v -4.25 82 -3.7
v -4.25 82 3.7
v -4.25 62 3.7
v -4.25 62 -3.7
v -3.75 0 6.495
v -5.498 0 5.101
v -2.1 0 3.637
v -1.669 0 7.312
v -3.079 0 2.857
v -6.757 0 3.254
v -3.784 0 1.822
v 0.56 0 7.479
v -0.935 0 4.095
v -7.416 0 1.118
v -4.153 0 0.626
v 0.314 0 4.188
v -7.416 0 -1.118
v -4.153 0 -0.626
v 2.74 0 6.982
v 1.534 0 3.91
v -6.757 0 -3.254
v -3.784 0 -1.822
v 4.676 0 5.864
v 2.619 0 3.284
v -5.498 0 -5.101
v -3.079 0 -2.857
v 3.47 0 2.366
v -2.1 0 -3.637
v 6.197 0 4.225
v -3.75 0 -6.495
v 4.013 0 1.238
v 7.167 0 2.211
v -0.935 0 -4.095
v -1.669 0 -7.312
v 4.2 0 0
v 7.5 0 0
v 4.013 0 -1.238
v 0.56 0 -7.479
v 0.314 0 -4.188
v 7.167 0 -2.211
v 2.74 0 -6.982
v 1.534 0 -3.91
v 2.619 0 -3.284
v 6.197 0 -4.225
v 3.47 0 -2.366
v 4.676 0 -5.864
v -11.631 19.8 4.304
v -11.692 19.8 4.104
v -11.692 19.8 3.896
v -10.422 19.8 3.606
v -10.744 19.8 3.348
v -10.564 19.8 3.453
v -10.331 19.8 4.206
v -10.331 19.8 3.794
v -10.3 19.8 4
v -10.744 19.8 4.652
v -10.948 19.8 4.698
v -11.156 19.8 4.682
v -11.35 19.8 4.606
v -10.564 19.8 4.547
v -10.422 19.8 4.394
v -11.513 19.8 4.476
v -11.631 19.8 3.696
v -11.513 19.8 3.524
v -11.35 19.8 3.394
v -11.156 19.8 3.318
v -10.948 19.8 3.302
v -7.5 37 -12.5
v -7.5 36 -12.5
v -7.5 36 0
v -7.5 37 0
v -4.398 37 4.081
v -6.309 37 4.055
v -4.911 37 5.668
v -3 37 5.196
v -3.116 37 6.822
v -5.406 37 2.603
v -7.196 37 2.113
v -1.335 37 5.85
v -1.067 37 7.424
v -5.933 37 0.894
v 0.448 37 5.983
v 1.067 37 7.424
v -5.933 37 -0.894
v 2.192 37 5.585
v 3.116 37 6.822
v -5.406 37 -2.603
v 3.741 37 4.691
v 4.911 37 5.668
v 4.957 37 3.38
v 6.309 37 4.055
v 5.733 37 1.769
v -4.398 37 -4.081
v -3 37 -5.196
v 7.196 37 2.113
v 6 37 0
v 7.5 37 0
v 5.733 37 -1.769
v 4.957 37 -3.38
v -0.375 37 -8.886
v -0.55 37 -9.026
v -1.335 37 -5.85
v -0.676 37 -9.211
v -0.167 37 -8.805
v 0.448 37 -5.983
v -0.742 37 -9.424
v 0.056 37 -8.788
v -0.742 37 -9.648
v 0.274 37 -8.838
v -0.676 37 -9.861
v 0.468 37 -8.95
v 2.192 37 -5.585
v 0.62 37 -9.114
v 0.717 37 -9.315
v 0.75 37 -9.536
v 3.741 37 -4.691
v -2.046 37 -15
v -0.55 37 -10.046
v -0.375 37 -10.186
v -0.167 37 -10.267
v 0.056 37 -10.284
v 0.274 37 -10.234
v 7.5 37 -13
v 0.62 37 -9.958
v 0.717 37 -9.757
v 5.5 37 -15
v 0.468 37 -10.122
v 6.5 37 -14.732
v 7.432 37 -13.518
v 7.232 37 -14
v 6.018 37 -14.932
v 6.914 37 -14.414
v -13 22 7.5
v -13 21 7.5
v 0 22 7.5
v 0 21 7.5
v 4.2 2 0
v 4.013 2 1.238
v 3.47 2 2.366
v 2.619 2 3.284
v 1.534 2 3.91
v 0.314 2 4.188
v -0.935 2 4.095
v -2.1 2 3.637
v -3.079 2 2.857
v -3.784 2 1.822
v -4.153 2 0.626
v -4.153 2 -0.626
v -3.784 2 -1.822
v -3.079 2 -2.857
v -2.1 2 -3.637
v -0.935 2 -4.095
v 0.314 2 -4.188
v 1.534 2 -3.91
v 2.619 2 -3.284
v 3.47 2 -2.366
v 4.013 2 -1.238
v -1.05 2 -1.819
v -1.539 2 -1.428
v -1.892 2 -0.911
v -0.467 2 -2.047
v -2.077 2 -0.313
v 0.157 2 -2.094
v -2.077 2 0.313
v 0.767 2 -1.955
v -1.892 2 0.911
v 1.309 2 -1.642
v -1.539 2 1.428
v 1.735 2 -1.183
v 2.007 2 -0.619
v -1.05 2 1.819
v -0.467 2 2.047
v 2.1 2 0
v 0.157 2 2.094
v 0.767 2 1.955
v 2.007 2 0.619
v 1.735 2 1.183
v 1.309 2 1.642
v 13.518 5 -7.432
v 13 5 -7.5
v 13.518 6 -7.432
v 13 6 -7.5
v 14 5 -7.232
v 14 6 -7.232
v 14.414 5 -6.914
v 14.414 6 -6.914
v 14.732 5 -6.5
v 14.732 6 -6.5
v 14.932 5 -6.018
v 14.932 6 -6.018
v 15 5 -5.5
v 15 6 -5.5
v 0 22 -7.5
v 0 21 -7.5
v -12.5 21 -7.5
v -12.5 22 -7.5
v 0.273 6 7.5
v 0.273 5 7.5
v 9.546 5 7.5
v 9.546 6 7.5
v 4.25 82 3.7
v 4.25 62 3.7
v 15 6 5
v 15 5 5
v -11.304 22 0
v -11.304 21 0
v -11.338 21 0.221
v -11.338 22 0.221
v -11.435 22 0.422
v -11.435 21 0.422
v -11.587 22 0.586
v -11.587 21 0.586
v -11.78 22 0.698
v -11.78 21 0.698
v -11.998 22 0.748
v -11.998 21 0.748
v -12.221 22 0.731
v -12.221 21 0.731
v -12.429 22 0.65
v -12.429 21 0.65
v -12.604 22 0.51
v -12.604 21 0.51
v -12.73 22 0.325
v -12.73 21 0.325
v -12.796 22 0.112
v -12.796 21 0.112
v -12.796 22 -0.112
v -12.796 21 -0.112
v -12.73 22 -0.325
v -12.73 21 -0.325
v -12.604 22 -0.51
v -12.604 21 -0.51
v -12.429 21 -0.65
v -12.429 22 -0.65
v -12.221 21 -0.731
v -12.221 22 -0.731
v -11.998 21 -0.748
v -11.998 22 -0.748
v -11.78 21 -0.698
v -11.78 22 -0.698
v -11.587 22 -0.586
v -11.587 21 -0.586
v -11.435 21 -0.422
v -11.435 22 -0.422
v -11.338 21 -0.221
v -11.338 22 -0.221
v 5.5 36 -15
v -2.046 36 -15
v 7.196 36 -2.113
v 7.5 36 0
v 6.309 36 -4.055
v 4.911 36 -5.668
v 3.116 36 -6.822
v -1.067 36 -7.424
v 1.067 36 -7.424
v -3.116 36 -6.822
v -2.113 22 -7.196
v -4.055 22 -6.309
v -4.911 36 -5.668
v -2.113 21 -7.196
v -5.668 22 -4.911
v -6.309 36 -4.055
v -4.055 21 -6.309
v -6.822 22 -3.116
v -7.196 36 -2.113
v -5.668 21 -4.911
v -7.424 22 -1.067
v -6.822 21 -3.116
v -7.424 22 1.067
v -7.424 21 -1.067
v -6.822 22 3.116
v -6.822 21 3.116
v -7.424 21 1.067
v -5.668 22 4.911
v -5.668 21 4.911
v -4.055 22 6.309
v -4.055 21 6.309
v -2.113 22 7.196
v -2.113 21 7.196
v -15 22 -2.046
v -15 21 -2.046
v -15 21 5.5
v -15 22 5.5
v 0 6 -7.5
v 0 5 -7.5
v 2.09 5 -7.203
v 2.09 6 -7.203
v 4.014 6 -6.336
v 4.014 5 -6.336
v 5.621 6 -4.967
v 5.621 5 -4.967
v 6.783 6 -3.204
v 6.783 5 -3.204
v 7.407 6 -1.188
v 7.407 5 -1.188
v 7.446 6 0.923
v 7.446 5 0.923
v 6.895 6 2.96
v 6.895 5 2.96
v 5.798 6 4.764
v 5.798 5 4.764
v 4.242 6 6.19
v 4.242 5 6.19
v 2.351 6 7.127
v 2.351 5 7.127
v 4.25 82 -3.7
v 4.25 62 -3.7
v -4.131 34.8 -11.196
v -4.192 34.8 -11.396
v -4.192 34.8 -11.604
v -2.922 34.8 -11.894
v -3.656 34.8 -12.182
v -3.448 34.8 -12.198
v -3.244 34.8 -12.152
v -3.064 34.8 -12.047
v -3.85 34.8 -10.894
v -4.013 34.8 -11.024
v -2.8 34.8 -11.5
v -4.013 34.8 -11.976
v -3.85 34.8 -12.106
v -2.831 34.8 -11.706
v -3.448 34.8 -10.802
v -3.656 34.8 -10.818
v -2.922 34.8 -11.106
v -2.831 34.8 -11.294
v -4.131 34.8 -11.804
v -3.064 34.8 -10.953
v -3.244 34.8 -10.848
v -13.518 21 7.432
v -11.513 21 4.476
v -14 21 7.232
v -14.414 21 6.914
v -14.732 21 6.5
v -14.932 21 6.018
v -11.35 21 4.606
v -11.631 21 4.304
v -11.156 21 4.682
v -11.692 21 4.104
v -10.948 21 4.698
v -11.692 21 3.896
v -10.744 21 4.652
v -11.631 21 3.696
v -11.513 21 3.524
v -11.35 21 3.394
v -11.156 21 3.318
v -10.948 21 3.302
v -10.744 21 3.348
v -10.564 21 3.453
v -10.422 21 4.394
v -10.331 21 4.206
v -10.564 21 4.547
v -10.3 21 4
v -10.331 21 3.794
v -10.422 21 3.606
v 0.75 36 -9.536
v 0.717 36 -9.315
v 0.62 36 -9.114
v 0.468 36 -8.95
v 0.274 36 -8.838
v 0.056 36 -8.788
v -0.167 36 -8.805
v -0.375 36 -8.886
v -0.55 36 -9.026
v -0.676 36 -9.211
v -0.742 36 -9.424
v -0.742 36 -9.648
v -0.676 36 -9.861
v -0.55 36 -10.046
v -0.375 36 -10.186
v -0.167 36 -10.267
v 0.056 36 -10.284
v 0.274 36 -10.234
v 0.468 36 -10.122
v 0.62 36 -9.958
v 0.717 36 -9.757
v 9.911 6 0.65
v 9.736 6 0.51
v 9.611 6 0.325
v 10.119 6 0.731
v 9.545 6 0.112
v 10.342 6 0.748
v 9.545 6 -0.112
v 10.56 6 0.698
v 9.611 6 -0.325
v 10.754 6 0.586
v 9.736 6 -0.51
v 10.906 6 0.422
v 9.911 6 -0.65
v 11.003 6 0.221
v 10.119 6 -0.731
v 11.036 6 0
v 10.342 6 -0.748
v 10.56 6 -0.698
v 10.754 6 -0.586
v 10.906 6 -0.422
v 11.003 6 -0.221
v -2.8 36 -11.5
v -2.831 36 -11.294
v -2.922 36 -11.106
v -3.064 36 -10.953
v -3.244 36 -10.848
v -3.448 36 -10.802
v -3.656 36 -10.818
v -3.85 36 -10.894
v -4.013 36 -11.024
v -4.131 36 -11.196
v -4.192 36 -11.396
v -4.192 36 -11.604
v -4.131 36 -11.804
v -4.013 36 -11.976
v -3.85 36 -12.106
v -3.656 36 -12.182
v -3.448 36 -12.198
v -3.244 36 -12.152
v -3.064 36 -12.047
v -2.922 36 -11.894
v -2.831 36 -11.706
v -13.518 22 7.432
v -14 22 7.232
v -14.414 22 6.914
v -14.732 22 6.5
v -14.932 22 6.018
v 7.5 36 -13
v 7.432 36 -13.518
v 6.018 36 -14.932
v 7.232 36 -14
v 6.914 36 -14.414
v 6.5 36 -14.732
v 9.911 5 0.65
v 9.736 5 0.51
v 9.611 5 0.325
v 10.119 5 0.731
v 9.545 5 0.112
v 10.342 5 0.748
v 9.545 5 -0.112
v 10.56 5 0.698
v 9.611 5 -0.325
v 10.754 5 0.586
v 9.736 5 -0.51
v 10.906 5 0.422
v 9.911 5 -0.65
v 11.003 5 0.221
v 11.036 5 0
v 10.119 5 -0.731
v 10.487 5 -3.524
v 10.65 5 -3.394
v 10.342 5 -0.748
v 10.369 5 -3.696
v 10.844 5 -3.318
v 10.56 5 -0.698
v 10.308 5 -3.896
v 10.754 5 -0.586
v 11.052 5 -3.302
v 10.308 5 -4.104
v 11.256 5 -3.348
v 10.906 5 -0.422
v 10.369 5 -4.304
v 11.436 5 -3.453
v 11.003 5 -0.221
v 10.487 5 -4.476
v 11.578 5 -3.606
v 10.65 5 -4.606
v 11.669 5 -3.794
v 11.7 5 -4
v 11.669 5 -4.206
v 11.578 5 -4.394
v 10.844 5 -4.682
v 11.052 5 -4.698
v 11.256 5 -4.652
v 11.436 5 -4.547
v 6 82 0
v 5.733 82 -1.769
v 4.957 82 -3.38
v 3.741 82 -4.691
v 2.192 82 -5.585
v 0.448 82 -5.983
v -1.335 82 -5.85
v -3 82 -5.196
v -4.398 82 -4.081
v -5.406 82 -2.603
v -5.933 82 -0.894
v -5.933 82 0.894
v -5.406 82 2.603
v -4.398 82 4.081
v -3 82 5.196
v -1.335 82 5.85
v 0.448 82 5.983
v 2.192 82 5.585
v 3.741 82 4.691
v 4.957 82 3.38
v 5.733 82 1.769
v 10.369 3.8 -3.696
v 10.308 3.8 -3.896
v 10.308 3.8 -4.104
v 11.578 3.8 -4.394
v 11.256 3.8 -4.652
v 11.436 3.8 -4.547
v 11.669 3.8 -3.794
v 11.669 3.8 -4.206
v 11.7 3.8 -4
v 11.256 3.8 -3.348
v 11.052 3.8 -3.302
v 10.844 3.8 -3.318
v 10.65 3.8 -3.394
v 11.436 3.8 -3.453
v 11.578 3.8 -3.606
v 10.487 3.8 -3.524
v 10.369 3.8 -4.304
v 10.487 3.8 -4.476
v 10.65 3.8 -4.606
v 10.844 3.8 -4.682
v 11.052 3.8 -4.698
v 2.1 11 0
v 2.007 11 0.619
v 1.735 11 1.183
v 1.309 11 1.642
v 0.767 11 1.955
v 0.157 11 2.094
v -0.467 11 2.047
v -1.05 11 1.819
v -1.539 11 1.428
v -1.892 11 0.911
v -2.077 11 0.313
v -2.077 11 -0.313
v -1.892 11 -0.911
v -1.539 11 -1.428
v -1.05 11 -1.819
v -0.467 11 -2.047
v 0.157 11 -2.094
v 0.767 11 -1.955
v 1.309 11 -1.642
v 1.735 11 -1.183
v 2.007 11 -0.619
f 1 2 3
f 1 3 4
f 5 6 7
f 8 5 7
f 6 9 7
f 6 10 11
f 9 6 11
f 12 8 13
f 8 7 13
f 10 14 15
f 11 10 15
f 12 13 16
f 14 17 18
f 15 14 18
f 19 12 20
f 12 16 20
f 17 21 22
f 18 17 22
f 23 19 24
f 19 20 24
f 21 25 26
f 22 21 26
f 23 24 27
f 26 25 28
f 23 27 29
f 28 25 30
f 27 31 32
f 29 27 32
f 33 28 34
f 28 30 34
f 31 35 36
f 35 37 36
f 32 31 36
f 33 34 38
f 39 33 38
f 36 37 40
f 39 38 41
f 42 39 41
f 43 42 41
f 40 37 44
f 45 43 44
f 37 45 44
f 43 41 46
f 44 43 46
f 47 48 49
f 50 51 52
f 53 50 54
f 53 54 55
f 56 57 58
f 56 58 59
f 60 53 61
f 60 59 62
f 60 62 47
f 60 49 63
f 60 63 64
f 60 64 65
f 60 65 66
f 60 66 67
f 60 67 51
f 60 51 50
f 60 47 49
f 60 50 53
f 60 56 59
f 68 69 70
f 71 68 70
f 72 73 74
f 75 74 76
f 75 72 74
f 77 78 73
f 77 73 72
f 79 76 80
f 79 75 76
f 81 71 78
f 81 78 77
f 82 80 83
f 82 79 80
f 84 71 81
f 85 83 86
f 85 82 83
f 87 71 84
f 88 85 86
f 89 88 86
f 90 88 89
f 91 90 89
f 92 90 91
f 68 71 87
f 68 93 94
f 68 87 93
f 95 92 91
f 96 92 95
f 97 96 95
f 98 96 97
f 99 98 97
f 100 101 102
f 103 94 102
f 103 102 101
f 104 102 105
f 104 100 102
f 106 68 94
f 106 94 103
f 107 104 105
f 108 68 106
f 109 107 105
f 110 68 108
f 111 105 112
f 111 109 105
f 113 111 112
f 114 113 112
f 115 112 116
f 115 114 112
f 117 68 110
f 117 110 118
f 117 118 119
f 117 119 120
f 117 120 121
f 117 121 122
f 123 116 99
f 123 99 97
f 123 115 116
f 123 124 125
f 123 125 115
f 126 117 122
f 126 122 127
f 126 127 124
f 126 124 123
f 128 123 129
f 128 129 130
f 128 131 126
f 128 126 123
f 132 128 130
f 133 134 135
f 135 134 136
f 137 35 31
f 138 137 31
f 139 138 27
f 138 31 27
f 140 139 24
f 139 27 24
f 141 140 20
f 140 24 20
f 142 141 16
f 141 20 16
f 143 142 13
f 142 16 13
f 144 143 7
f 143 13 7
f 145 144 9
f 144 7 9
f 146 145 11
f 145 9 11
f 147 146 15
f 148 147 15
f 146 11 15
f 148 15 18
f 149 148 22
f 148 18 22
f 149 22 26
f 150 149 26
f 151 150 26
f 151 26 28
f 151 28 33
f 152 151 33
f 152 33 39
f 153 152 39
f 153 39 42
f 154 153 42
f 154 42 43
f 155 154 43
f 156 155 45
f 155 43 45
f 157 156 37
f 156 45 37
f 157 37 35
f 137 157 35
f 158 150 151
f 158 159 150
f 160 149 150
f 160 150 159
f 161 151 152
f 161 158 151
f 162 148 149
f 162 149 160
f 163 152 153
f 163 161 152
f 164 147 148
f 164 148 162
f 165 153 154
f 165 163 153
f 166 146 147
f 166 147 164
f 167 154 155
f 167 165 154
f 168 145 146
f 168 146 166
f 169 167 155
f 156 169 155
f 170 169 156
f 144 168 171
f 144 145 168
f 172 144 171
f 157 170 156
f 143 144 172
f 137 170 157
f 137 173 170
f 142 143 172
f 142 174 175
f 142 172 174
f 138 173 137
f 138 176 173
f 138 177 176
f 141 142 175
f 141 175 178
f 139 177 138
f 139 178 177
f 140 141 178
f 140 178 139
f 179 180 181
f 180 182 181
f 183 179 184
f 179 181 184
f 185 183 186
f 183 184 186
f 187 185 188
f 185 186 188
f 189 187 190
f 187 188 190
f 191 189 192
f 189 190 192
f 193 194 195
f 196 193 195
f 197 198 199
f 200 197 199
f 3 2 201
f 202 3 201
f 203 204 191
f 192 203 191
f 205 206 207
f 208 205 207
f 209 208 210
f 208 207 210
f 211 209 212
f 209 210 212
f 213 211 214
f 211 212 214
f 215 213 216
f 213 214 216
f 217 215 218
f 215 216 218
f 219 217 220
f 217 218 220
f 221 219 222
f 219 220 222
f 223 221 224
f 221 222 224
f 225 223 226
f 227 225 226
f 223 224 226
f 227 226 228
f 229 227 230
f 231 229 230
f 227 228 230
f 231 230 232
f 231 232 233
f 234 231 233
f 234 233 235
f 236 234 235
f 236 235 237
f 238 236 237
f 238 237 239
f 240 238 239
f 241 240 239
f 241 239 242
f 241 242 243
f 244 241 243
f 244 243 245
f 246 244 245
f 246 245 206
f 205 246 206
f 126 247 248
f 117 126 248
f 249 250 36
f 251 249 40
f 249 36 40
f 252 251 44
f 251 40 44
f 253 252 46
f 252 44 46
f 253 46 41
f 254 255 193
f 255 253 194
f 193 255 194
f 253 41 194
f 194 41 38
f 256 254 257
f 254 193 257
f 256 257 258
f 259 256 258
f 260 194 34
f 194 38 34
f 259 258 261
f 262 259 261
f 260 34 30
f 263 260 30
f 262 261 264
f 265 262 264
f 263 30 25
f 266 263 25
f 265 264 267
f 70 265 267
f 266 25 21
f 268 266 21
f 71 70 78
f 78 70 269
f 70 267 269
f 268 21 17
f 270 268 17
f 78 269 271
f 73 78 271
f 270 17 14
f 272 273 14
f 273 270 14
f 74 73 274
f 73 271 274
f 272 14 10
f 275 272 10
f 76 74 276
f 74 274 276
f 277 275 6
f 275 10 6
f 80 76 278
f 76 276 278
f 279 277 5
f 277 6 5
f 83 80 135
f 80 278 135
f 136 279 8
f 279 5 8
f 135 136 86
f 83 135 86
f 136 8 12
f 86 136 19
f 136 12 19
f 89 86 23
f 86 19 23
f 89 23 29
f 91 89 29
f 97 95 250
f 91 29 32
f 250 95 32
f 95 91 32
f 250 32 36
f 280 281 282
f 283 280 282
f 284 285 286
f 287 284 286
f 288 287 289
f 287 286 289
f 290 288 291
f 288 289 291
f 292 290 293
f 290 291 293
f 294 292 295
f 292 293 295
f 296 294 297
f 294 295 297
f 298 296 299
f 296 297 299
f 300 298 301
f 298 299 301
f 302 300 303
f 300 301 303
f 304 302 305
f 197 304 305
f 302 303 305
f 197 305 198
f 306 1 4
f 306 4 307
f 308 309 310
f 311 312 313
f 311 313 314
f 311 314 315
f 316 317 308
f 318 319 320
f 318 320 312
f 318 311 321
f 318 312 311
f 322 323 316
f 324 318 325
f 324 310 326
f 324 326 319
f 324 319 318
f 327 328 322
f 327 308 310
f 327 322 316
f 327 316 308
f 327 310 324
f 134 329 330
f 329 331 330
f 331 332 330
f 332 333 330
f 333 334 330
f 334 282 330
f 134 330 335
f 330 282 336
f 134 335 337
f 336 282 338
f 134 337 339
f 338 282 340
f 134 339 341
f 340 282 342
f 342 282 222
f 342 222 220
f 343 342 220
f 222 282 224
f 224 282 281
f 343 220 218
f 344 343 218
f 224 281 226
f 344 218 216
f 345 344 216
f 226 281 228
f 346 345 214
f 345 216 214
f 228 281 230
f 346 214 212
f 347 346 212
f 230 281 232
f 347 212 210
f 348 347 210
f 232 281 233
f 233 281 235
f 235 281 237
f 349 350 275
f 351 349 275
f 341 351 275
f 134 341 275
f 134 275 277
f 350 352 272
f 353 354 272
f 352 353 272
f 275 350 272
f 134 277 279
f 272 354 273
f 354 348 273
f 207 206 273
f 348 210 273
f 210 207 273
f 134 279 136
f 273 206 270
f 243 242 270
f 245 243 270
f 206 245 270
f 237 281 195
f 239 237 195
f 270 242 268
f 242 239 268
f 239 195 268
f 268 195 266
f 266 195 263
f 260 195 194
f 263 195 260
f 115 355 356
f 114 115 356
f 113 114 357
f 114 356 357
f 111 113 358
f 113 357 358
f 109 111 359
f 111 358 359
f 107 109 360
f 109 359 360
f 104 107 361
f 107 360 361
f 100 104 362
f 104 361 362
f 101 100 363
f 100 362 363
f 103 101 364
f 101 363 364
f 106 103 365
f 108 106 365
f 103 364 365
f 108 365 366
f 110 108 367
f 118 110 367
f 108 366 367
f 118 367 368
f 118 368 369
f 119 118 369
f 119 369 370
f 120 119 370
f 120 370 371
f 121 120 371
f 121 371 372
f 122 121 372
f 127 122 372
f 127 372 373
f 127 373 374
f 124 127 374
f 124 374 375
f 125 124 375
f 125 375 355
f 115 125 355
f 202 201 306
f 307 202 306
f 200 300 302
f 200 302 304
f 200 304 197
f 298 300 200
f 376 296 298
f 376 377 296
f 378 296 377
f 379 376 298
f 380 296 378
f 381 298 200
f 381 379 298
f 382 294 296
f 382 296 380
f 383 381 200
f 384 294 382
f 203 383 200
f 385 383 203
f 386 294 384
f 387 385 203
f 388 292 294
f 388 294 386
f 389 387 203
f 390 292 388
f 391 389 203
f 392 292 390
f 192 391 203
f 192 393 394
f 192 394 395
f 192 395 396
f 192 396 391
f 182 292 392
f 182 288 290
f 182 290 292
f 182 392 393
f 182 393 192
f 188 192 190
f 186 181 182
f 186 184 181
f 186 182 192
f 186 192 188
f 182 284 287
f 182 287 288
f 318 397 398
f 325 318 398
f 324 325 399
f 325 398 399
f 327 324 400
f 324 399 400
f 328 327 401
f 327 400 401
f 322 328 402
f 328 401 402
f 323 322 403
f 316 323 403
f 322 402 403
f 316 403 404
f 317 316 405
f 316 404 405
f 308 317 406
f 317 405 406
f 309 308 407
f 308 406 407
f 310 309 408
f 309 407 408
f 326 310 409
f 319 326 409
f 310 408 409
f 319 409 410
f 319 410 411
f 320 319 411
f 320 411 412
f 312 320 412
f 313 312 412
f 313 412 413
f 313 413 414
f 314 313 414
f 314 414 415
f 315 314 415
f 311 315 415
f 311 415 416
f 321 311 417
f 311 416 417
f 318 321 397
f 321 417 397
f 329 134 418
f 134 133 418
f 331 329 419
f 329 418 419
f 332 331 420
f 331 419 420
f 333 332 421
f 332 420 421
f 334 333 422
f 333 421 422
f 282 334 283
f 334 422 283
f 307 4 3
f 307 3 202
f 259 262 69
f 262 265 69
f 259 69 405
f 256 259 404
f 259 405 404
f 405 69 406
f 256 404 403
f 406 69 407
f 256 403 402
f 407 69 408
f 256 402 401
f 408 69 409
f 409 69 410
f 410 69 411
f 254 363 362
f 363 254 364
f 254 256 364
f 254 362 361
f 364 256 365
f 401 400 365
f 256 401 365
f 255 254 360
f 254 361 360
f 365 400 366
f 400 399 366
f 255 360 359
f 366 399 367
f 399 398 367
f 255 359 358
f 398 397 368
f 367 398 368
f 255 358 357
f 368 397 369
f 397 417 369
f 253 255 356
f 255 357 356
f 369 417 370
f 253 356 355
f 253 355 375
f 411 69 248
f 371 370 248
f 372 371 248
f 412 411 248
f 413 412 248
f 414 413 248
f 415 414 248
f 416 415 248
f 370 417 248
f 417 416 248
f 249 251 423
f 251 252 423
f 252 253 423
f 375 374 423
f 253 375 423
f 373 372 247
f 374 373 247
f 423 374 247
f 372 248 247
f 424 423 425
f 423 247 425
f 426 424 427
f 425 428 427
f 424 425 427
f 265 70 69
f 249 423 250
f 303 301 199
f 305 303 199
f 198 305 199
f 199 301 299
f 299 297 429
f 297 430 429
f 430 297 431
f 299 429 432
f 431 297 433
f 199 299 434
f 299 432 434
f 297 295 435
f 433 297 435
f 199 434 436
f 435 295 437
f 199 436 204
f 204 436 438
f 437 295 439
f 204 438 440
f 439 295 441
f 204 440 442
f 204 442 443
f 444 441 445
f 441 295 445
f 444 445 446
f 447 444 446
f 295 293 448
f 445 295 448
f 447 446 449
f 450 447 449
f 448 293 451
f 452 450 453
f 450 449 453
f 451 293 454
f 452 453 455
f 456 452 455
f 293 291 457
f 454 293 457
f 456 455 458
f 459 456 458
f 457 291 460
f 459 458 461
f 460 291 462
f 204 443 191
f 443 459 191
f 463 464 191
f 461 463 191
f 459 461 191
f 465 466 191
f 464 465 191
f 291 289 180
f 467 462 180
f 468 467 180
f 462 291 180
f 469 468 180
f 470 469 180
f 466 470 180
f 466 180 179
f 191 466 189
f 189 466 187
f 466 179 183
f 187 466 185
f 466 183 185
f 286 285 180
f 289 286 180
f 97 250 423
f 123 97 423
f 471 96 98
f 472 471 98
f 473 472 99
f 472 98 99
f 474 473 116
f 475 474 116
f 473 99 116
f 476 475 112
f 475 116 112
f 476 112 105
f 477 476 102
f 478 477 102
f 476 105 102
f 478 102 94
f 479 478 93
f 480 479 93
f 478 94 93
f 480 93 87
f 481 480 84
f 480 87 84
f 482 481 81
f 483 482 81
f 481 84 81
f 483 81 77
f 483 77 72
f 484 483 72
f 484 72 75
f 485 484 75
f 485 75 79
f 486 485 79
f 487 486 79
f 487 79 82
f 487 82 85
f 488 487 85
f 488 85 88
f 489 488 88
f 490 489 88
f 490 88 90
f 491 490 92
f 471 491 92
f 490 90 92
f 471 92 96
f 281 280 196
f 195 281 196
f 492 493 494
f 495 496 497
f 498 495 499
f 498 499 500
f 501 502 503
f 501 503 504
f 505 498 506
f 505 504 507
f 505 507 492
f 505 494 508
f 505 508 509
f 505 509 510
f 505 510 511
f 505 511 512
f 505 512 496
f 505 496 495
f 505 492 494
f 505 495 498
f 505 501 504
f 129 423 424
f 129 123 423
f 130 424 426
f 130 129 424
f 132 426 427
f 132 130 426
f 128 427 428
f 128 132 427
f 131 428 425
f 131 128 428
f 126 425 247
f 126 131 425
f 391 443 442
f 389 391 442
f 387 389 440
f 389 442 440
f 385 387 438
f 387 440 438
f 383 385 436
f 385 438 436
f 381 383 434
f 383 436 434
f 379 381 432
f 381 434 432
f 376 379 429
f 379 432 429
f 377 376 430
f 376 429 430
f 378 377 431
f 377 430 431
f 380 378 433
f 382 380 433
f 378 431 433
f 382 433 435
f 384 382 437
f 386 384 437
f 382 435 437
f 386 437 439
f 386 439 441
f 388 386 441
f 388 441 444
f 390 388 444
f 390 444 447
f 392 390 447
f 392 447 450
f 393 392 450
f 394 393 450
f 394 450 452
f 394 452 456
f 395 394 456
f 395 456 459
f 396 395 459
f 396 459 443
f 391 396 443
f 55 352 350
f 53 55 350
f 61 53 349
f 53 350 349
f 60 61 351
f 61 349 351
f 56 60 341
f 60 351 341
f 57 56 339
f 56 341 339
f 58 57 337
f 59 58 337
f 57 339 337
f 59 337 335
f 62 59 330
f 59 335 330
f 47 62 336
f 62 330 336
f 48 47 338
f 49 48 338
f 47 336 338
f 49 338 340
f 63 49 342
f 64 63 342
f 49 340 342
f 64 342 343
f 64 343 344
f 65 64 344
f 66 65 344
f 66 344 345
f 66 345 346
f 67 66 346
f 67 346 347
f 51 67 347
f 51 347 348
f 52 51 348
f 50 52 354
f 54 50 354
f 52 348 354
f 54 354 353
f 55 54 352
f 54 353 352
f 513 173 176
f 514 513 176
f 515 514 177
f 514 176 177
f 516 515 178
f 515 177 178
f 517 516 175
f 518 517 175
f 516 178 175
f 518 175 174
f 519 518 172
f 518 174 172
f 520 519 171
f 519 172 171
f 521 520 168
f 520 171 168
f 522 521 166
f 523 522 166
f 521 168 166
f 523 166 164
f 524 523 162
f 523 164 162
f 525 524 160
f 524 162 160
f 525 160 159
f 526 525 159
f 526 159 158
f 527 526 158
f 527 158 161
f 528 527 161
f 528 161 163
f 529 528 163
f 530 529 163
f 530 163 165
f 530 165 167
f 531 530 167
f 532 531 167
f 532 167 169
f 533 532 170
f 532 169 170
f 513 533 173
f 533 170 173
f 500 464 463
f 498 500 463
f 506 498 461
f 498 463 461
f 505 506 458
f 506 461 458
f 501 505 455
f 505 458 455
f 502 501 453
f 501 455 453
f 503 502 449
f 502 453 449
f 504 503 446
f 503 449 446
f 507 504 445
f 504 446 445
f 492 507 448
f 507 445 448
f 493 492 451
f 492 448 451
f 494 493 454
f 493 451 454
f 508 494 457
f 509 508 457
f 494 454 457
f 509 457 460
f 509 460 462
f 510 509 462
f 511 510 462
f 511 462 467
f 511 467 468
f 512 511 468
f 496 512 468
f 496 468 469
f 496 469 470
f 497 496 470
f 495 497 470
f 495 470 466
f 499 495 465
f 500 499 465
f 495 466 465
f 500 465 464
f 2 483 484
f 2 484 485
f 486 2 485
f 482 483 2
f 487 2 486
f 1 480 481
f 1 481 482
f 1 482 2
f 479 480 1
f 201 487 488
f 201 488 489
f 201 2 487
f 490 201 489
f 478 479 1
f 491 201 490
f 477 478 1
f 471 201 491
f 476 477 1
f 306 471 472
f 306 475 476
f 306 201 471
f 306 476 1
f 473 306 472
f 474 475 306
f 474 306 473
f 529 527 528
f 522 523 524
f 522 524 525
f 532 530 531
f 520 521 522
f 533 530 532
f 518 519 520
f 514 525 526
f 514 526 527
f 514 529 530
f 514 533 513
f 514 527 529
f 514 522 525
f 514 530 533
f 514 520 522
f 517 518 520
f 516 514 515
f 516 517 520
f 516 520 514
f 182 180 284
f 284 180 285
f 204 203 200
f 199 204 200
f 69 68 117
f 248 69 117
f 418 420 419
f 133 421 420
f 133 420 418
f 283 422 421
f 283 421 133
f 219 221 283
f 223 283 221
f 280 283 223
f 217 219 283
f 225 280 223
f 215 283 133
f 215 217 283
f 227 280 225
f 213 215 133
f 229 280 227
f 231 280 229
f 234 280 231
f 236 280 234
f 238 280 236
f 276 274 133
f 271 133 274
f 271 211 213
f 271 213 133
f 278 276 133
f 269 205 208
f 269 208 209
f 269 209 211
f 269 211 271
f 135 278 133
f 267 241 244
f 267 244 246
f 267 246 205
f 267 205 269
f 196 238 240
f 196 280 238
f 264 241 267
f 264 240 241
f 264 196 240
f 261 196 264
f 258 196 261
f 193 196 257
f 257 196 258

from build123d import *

# Parameters (mm, degrees)
SKETCH1_R            = 7.5
BOSS_EXTRUDE6_DEPTH  = 5
BOSS_EXTRUDE7_DEPTH  = 1
SKETCH22_R           = 7.5
BOSS_EXTRUDE12_DEPTH = 8
SKETCH30_R           = 4.2
CUT_EXTRUDE8_DEPTH   = 2
SKETCH31_R           = 2.1
CUT_EXTRUDE9_DEPTH   = 9
SKETCH33_R           = 7.5
BOSS_EXTRUDE19_DEPTH = 8
BOSS_EXTRUDE20_DEPTH = 1
SKETCH35_R           = 7.5
BOSS_EXTRUDE21_DEPTH = 15
BOSS_EXTRUDE22_DEPTH = 1
SKETCH37_R           = 7.5
BOSS_EXTRUDE23_DEPTH = 1
SKETCH38_R           = 6
BOSS_EXTRUDE24_DEPTH = 45
CUT_EXTRUDE11_DEPTH  = 1
CUT_EXTRUDE12_DEPTH  = 1
CUT_EXTRUDE13_DEPTH  = 1
SKETCH44_W           = 8.5
SKETCH44_H           = 7.4
CUT_EXTRUDE19_DEPTH  = 20
FILLET3_R            = 2
FILLET4_R            = 2
FILLET5_R            = 2
SKETCH51_R           = 0.7
BOSS_EXTRUDE25_DEPTH = 1.2
SKETCH53_R           = 0.7
BOSS_EXTRUDE27_DEPTH = 1.2
SKETCH52_R           = 0.7
BOSS_EXTRUDE28_DEPTH = 1.2
SKETCH59_R           = 0.75
CUT_EXTRUDE23_DEPTH  = 2
SKETCH60_R           = 0.75
CUT_EXTRUDE25_DEPTH  = 2
SKETCH58_R           = 0.75
CUT_EXTRUDE29_DEPTH  = 10


with BuildPart() as part:
    # Sketch1 → Boss-Extrude6 (new body)
    with BuildSketch(Plane(origin=(0, 0, 0), x_dir=(1, 0, 0), z_dir=(0, 1, 0))):
        Circle(SKETCH1_R)
    extrude(amount=BOSS_EXTRUDE6_DEPTH)

    # Sketch22 → Boss-Extrude12 (add)
    with BuildSketch(Plane(origin=(0, 5, 0), x_dir=(1, 0, 0), z_dir=(0, 1, 0))):
        Circle(SKETCH22_R)
    extrude(amount=BOSS_EXTRUDE12_DEPTH)

    # Sketch30 → Cut-Extrude8 (cut)
    with BuildSketch(Plane.XZ):
        Circle(SKETCH30_R)
    extrude(amount=-CUT_EXTRUDE8_DEPTH, mode=Mode.SUBTRACT)

    # Sketch31 → Cut-Extrude9 (cut)
    with BuildSketch(Plane.XZ.offset(-2)):
        Circle(SKETCH31_R)
    extrude(amount=-CUT_EXTRUDE9_DEPTH, mode=Mode.SUBTRACT)

    # Sketch33 → Boss-Extrude19 (add)
    with BuildSketch(Plane(origin=(0, 13, 0), x_dir=(1, 0, 0), z_dir=(0, 1, 0))):
        Circle(SKETCH33_R)
    extrude(amount=BOSS_EXTRUDE19_DEPTH)



with BuildPart() as body_2:
    # Sketch16 → Boss-Extrude7 (new body)
    with BuildSketch(Plane(origin=(0, 5, 0), x_dir=(1, 0, 0), z_dir=(0, 1, 0))):
        with BuildLine():
            Line((15, 7.5), (0, 7.5))
            ThreePointArc((0, 7.5), (7.501258216, 0.134044682), (0.2730459, -7.500031508))
            Line((0.2730459, -7.500031508), (15, -7.500031508))
            Line((15, -7.500031508), (15, 7.5))
        make_face()
    extrude(amount=BOSS_EXTRUDE7_DEPTH)

    # Sketch41 → Cut-Extrude12 (cut)
    with BuildSketch(Plane(origin=(0, 6, 0), x_dir=(1, 0, 0), z_dir=(0, 1, 0))):
        Polygon((15, -5.000031508), (9.545643943, -7.500031508), (15, -7.500031508), align=None)
    extrude(amount=-CUT_EXTRUDE12_DEPTH, mode=Mode.SUBTRACT)

    # Fillet3
    fillet3_edges = [body_2.edges().sort_by_distance(p)[0] for p in [
        (15, 5.5, -7.5),
    ]]
    fillet(fillet3_edges, radius=FILLET3_R)

    # Sketch51 → Boss-Extrude25 (add)
    with BuildSketch(Plane.XZ.offset(-5)):
        with Locations((11, -4)):
            Circle(SKETCH51_R)
    extrude(amount=BOSS_EXTRUDE25_DEPTH)

    # Sketch60 → Cut-Extrude25 (cut)
    with BuildSketch(Plane.XZ.offset(-5)):
        with Locations((10.286249768, 0)):
            Circle(SKETCH60_R)
    extrude(amount=-CUT_EXTRUDE25_DEPTH, mode=Mode.SUBTRACT)


with BuildPart() as body_3:
    # Sketch34 → Boss-Extrude20 (new body)
    with BuildSketch(Plane(origin=(0, 21, 0), x_dir=(1, 0, 0), z_dir=(0, 1, 0))):
        with BuildLine():
            Line((0, 7.5), (-15, 7.5))
            Line((-15, 7.5), (-15, -7.5))
            Line((-15, -7.5), (0, -7.5))
            ThreePointArc((0, -7.5), (-7.5, 0), (0, 7.5))
        make_face()
    extrude(amount=BOSS_EXTRUDE20_DEPTH)


with BuildPart() as part_1:
    add(part.part)

    add(body_3.part)  # Boss-Extrude21 merges body 3
    # Sketch35 → Boss-Extrude21 (add)
    with BuildSketch(Plane(origin=(0, 21, 0), x_dir=(1, 0, 0), z_dir=(0, 1, 0))):
        Circle(SKETCH35_R)
    extrude(amount=BOSS_EXTRUDE21_DEPTH)



with BuildPart() as body_3_2:
    # Sketch36 → Boss-Extrude22 (new body)
    with BuildSketch(Plane(origin=(0, 36, 0), x_dir=(1, 0, 0), z_dir=(0, 1, 0))):
        with BuildLine():
            Line((7.5, 0), (7.5, 15))
            Line((7.5, 15), (-7.5, 15))
            Line((-7.5, 15), (-7.5, 0))
            ThreePointArc((-7.5, 0), (0, 7.5), (7.5, 0))
        make_face()
    extrude(amount=BOSS_EXTRUDE22_DEPTH)


with BuildPart() as part_2:
    add(part_1.part)

    add(body_3_2.part)  # Boss-Extrude23 merges body 3 2
    # Sketch37 → Boss-Extrude23 (add)
    with BuildSketch(Plane(origin=(0, 36, 0), x_dir=(1, 0, 0), z_dir=(0, 1, 0))):
        Circle(SKETCH37_R)
    extrude(amount=BOSS_EXTRUDE23_DEPTH)

    # Sketch38 → Boss-Extrude24 (add)
    with BuildSketch(Plane(origin=(0, 37, 0), x_dir=(1, 0, 0), z_dir=(0, 1, 0))):
        Circle(SKETCH38_R)
    extrude(amount=BOSS_EXTRUDE24_DEPTH)

    # Sketch40 → Cut-Extrude11 (cut)
    with BuildSketch(Plane(origin=(0, 37, 0), x_dir=(1, 0, 0), z_dir=(0, 1, 0))):
        Polygon((-7.5, 15), (-7.5, 12.5), (-2.045643943, 15), align=None)
    extrude(amount=-CUT_EXTRUDE11_DEPTH, mode=Mode.SUBTRACT)

    # Sketch42 → Cut-Extrude13 (cut)
    with BuildSketch(Plane(origin=(0, 22, 0), x_dir=(1, 0, 0), z_dir=(0, 1, 0))):
        Polygon((-15, 2.045643943), (-12.5, 7.5), (-15, 7.5), align=None)
    extrude(amount=-CUT_EXTRUDE13_DEPTH, mode=Mode.SUBTRACT)

    # Sketch44 → Cut-Extrude19 (cut)
    with BuildSketch(Plane(origin=(0, 82, 0), x_dir=(1, 0, 0), z_dir=(0, 1, 0))):
        Rectangle(SKETCH44_W, SKETCH44_H)
    extrude(amount=-CUT_EXTRUDE19_DEPTH, mode=Mode.SUBTRACT)

    # Fillet4
    fillet4_edges = [part_2.edges().sort_by_distance(p)[0] for p in [
        (-15, 21.5, 7.5),
    ]]
    fillet(fillet4_edges, radius=FILLET4_R)

    # Fillet5
    fillet5_edges = [part_2.edges().sort_by_distance(p)[0] for p in [
        (7.5, 36.5, -15),
    ]]
    fillet(fillet5_edges, radius=FILLET5_R)

    # Sketch53 → Boss-Extrude27 (add)
    with BuildSketch(Plane.XZ.offset(-36)):
        with Locations((-3.5, -11.5)):
            Circle(SKETCH53_R)
    extrude(amount=BOSS_EXTRUDE27_DEPTH)

    # Sketch52 → Boss-Extrude28 (add)
    with BuildSketch(Plane.XZ.offset(-21)):
        with Locations((-11, 4)):
            Circle(SKETCH52_R)
    extrude(amount=BOSS_EXTRUDE28_DEPTH)

    # Sketch59 → Cut-Extrude23 (cut)
    with BuildSketch(Plane.XZ.offset(-36)):
        with Locations((0, -9.535999741)):
            Circle(SKETCH59_R)
    extrude(amount=-CUT_EXTRUDE23_DEPTH, mode=Mode.SUBTRACT)

    # Sketch58 → Cut-Extrude29 (cut)
    with BuildSketch(Plane.XZ.offset(-21)):
        with Locations((-12.054198947, 0)):
            Circle(SKETCH58_R)
    extrude(amount=-CUT_EXTRUDE29_DEPTH, mode=Mode.SUBTRACT)


solid = Compound([body_2.part, part_2.part])
